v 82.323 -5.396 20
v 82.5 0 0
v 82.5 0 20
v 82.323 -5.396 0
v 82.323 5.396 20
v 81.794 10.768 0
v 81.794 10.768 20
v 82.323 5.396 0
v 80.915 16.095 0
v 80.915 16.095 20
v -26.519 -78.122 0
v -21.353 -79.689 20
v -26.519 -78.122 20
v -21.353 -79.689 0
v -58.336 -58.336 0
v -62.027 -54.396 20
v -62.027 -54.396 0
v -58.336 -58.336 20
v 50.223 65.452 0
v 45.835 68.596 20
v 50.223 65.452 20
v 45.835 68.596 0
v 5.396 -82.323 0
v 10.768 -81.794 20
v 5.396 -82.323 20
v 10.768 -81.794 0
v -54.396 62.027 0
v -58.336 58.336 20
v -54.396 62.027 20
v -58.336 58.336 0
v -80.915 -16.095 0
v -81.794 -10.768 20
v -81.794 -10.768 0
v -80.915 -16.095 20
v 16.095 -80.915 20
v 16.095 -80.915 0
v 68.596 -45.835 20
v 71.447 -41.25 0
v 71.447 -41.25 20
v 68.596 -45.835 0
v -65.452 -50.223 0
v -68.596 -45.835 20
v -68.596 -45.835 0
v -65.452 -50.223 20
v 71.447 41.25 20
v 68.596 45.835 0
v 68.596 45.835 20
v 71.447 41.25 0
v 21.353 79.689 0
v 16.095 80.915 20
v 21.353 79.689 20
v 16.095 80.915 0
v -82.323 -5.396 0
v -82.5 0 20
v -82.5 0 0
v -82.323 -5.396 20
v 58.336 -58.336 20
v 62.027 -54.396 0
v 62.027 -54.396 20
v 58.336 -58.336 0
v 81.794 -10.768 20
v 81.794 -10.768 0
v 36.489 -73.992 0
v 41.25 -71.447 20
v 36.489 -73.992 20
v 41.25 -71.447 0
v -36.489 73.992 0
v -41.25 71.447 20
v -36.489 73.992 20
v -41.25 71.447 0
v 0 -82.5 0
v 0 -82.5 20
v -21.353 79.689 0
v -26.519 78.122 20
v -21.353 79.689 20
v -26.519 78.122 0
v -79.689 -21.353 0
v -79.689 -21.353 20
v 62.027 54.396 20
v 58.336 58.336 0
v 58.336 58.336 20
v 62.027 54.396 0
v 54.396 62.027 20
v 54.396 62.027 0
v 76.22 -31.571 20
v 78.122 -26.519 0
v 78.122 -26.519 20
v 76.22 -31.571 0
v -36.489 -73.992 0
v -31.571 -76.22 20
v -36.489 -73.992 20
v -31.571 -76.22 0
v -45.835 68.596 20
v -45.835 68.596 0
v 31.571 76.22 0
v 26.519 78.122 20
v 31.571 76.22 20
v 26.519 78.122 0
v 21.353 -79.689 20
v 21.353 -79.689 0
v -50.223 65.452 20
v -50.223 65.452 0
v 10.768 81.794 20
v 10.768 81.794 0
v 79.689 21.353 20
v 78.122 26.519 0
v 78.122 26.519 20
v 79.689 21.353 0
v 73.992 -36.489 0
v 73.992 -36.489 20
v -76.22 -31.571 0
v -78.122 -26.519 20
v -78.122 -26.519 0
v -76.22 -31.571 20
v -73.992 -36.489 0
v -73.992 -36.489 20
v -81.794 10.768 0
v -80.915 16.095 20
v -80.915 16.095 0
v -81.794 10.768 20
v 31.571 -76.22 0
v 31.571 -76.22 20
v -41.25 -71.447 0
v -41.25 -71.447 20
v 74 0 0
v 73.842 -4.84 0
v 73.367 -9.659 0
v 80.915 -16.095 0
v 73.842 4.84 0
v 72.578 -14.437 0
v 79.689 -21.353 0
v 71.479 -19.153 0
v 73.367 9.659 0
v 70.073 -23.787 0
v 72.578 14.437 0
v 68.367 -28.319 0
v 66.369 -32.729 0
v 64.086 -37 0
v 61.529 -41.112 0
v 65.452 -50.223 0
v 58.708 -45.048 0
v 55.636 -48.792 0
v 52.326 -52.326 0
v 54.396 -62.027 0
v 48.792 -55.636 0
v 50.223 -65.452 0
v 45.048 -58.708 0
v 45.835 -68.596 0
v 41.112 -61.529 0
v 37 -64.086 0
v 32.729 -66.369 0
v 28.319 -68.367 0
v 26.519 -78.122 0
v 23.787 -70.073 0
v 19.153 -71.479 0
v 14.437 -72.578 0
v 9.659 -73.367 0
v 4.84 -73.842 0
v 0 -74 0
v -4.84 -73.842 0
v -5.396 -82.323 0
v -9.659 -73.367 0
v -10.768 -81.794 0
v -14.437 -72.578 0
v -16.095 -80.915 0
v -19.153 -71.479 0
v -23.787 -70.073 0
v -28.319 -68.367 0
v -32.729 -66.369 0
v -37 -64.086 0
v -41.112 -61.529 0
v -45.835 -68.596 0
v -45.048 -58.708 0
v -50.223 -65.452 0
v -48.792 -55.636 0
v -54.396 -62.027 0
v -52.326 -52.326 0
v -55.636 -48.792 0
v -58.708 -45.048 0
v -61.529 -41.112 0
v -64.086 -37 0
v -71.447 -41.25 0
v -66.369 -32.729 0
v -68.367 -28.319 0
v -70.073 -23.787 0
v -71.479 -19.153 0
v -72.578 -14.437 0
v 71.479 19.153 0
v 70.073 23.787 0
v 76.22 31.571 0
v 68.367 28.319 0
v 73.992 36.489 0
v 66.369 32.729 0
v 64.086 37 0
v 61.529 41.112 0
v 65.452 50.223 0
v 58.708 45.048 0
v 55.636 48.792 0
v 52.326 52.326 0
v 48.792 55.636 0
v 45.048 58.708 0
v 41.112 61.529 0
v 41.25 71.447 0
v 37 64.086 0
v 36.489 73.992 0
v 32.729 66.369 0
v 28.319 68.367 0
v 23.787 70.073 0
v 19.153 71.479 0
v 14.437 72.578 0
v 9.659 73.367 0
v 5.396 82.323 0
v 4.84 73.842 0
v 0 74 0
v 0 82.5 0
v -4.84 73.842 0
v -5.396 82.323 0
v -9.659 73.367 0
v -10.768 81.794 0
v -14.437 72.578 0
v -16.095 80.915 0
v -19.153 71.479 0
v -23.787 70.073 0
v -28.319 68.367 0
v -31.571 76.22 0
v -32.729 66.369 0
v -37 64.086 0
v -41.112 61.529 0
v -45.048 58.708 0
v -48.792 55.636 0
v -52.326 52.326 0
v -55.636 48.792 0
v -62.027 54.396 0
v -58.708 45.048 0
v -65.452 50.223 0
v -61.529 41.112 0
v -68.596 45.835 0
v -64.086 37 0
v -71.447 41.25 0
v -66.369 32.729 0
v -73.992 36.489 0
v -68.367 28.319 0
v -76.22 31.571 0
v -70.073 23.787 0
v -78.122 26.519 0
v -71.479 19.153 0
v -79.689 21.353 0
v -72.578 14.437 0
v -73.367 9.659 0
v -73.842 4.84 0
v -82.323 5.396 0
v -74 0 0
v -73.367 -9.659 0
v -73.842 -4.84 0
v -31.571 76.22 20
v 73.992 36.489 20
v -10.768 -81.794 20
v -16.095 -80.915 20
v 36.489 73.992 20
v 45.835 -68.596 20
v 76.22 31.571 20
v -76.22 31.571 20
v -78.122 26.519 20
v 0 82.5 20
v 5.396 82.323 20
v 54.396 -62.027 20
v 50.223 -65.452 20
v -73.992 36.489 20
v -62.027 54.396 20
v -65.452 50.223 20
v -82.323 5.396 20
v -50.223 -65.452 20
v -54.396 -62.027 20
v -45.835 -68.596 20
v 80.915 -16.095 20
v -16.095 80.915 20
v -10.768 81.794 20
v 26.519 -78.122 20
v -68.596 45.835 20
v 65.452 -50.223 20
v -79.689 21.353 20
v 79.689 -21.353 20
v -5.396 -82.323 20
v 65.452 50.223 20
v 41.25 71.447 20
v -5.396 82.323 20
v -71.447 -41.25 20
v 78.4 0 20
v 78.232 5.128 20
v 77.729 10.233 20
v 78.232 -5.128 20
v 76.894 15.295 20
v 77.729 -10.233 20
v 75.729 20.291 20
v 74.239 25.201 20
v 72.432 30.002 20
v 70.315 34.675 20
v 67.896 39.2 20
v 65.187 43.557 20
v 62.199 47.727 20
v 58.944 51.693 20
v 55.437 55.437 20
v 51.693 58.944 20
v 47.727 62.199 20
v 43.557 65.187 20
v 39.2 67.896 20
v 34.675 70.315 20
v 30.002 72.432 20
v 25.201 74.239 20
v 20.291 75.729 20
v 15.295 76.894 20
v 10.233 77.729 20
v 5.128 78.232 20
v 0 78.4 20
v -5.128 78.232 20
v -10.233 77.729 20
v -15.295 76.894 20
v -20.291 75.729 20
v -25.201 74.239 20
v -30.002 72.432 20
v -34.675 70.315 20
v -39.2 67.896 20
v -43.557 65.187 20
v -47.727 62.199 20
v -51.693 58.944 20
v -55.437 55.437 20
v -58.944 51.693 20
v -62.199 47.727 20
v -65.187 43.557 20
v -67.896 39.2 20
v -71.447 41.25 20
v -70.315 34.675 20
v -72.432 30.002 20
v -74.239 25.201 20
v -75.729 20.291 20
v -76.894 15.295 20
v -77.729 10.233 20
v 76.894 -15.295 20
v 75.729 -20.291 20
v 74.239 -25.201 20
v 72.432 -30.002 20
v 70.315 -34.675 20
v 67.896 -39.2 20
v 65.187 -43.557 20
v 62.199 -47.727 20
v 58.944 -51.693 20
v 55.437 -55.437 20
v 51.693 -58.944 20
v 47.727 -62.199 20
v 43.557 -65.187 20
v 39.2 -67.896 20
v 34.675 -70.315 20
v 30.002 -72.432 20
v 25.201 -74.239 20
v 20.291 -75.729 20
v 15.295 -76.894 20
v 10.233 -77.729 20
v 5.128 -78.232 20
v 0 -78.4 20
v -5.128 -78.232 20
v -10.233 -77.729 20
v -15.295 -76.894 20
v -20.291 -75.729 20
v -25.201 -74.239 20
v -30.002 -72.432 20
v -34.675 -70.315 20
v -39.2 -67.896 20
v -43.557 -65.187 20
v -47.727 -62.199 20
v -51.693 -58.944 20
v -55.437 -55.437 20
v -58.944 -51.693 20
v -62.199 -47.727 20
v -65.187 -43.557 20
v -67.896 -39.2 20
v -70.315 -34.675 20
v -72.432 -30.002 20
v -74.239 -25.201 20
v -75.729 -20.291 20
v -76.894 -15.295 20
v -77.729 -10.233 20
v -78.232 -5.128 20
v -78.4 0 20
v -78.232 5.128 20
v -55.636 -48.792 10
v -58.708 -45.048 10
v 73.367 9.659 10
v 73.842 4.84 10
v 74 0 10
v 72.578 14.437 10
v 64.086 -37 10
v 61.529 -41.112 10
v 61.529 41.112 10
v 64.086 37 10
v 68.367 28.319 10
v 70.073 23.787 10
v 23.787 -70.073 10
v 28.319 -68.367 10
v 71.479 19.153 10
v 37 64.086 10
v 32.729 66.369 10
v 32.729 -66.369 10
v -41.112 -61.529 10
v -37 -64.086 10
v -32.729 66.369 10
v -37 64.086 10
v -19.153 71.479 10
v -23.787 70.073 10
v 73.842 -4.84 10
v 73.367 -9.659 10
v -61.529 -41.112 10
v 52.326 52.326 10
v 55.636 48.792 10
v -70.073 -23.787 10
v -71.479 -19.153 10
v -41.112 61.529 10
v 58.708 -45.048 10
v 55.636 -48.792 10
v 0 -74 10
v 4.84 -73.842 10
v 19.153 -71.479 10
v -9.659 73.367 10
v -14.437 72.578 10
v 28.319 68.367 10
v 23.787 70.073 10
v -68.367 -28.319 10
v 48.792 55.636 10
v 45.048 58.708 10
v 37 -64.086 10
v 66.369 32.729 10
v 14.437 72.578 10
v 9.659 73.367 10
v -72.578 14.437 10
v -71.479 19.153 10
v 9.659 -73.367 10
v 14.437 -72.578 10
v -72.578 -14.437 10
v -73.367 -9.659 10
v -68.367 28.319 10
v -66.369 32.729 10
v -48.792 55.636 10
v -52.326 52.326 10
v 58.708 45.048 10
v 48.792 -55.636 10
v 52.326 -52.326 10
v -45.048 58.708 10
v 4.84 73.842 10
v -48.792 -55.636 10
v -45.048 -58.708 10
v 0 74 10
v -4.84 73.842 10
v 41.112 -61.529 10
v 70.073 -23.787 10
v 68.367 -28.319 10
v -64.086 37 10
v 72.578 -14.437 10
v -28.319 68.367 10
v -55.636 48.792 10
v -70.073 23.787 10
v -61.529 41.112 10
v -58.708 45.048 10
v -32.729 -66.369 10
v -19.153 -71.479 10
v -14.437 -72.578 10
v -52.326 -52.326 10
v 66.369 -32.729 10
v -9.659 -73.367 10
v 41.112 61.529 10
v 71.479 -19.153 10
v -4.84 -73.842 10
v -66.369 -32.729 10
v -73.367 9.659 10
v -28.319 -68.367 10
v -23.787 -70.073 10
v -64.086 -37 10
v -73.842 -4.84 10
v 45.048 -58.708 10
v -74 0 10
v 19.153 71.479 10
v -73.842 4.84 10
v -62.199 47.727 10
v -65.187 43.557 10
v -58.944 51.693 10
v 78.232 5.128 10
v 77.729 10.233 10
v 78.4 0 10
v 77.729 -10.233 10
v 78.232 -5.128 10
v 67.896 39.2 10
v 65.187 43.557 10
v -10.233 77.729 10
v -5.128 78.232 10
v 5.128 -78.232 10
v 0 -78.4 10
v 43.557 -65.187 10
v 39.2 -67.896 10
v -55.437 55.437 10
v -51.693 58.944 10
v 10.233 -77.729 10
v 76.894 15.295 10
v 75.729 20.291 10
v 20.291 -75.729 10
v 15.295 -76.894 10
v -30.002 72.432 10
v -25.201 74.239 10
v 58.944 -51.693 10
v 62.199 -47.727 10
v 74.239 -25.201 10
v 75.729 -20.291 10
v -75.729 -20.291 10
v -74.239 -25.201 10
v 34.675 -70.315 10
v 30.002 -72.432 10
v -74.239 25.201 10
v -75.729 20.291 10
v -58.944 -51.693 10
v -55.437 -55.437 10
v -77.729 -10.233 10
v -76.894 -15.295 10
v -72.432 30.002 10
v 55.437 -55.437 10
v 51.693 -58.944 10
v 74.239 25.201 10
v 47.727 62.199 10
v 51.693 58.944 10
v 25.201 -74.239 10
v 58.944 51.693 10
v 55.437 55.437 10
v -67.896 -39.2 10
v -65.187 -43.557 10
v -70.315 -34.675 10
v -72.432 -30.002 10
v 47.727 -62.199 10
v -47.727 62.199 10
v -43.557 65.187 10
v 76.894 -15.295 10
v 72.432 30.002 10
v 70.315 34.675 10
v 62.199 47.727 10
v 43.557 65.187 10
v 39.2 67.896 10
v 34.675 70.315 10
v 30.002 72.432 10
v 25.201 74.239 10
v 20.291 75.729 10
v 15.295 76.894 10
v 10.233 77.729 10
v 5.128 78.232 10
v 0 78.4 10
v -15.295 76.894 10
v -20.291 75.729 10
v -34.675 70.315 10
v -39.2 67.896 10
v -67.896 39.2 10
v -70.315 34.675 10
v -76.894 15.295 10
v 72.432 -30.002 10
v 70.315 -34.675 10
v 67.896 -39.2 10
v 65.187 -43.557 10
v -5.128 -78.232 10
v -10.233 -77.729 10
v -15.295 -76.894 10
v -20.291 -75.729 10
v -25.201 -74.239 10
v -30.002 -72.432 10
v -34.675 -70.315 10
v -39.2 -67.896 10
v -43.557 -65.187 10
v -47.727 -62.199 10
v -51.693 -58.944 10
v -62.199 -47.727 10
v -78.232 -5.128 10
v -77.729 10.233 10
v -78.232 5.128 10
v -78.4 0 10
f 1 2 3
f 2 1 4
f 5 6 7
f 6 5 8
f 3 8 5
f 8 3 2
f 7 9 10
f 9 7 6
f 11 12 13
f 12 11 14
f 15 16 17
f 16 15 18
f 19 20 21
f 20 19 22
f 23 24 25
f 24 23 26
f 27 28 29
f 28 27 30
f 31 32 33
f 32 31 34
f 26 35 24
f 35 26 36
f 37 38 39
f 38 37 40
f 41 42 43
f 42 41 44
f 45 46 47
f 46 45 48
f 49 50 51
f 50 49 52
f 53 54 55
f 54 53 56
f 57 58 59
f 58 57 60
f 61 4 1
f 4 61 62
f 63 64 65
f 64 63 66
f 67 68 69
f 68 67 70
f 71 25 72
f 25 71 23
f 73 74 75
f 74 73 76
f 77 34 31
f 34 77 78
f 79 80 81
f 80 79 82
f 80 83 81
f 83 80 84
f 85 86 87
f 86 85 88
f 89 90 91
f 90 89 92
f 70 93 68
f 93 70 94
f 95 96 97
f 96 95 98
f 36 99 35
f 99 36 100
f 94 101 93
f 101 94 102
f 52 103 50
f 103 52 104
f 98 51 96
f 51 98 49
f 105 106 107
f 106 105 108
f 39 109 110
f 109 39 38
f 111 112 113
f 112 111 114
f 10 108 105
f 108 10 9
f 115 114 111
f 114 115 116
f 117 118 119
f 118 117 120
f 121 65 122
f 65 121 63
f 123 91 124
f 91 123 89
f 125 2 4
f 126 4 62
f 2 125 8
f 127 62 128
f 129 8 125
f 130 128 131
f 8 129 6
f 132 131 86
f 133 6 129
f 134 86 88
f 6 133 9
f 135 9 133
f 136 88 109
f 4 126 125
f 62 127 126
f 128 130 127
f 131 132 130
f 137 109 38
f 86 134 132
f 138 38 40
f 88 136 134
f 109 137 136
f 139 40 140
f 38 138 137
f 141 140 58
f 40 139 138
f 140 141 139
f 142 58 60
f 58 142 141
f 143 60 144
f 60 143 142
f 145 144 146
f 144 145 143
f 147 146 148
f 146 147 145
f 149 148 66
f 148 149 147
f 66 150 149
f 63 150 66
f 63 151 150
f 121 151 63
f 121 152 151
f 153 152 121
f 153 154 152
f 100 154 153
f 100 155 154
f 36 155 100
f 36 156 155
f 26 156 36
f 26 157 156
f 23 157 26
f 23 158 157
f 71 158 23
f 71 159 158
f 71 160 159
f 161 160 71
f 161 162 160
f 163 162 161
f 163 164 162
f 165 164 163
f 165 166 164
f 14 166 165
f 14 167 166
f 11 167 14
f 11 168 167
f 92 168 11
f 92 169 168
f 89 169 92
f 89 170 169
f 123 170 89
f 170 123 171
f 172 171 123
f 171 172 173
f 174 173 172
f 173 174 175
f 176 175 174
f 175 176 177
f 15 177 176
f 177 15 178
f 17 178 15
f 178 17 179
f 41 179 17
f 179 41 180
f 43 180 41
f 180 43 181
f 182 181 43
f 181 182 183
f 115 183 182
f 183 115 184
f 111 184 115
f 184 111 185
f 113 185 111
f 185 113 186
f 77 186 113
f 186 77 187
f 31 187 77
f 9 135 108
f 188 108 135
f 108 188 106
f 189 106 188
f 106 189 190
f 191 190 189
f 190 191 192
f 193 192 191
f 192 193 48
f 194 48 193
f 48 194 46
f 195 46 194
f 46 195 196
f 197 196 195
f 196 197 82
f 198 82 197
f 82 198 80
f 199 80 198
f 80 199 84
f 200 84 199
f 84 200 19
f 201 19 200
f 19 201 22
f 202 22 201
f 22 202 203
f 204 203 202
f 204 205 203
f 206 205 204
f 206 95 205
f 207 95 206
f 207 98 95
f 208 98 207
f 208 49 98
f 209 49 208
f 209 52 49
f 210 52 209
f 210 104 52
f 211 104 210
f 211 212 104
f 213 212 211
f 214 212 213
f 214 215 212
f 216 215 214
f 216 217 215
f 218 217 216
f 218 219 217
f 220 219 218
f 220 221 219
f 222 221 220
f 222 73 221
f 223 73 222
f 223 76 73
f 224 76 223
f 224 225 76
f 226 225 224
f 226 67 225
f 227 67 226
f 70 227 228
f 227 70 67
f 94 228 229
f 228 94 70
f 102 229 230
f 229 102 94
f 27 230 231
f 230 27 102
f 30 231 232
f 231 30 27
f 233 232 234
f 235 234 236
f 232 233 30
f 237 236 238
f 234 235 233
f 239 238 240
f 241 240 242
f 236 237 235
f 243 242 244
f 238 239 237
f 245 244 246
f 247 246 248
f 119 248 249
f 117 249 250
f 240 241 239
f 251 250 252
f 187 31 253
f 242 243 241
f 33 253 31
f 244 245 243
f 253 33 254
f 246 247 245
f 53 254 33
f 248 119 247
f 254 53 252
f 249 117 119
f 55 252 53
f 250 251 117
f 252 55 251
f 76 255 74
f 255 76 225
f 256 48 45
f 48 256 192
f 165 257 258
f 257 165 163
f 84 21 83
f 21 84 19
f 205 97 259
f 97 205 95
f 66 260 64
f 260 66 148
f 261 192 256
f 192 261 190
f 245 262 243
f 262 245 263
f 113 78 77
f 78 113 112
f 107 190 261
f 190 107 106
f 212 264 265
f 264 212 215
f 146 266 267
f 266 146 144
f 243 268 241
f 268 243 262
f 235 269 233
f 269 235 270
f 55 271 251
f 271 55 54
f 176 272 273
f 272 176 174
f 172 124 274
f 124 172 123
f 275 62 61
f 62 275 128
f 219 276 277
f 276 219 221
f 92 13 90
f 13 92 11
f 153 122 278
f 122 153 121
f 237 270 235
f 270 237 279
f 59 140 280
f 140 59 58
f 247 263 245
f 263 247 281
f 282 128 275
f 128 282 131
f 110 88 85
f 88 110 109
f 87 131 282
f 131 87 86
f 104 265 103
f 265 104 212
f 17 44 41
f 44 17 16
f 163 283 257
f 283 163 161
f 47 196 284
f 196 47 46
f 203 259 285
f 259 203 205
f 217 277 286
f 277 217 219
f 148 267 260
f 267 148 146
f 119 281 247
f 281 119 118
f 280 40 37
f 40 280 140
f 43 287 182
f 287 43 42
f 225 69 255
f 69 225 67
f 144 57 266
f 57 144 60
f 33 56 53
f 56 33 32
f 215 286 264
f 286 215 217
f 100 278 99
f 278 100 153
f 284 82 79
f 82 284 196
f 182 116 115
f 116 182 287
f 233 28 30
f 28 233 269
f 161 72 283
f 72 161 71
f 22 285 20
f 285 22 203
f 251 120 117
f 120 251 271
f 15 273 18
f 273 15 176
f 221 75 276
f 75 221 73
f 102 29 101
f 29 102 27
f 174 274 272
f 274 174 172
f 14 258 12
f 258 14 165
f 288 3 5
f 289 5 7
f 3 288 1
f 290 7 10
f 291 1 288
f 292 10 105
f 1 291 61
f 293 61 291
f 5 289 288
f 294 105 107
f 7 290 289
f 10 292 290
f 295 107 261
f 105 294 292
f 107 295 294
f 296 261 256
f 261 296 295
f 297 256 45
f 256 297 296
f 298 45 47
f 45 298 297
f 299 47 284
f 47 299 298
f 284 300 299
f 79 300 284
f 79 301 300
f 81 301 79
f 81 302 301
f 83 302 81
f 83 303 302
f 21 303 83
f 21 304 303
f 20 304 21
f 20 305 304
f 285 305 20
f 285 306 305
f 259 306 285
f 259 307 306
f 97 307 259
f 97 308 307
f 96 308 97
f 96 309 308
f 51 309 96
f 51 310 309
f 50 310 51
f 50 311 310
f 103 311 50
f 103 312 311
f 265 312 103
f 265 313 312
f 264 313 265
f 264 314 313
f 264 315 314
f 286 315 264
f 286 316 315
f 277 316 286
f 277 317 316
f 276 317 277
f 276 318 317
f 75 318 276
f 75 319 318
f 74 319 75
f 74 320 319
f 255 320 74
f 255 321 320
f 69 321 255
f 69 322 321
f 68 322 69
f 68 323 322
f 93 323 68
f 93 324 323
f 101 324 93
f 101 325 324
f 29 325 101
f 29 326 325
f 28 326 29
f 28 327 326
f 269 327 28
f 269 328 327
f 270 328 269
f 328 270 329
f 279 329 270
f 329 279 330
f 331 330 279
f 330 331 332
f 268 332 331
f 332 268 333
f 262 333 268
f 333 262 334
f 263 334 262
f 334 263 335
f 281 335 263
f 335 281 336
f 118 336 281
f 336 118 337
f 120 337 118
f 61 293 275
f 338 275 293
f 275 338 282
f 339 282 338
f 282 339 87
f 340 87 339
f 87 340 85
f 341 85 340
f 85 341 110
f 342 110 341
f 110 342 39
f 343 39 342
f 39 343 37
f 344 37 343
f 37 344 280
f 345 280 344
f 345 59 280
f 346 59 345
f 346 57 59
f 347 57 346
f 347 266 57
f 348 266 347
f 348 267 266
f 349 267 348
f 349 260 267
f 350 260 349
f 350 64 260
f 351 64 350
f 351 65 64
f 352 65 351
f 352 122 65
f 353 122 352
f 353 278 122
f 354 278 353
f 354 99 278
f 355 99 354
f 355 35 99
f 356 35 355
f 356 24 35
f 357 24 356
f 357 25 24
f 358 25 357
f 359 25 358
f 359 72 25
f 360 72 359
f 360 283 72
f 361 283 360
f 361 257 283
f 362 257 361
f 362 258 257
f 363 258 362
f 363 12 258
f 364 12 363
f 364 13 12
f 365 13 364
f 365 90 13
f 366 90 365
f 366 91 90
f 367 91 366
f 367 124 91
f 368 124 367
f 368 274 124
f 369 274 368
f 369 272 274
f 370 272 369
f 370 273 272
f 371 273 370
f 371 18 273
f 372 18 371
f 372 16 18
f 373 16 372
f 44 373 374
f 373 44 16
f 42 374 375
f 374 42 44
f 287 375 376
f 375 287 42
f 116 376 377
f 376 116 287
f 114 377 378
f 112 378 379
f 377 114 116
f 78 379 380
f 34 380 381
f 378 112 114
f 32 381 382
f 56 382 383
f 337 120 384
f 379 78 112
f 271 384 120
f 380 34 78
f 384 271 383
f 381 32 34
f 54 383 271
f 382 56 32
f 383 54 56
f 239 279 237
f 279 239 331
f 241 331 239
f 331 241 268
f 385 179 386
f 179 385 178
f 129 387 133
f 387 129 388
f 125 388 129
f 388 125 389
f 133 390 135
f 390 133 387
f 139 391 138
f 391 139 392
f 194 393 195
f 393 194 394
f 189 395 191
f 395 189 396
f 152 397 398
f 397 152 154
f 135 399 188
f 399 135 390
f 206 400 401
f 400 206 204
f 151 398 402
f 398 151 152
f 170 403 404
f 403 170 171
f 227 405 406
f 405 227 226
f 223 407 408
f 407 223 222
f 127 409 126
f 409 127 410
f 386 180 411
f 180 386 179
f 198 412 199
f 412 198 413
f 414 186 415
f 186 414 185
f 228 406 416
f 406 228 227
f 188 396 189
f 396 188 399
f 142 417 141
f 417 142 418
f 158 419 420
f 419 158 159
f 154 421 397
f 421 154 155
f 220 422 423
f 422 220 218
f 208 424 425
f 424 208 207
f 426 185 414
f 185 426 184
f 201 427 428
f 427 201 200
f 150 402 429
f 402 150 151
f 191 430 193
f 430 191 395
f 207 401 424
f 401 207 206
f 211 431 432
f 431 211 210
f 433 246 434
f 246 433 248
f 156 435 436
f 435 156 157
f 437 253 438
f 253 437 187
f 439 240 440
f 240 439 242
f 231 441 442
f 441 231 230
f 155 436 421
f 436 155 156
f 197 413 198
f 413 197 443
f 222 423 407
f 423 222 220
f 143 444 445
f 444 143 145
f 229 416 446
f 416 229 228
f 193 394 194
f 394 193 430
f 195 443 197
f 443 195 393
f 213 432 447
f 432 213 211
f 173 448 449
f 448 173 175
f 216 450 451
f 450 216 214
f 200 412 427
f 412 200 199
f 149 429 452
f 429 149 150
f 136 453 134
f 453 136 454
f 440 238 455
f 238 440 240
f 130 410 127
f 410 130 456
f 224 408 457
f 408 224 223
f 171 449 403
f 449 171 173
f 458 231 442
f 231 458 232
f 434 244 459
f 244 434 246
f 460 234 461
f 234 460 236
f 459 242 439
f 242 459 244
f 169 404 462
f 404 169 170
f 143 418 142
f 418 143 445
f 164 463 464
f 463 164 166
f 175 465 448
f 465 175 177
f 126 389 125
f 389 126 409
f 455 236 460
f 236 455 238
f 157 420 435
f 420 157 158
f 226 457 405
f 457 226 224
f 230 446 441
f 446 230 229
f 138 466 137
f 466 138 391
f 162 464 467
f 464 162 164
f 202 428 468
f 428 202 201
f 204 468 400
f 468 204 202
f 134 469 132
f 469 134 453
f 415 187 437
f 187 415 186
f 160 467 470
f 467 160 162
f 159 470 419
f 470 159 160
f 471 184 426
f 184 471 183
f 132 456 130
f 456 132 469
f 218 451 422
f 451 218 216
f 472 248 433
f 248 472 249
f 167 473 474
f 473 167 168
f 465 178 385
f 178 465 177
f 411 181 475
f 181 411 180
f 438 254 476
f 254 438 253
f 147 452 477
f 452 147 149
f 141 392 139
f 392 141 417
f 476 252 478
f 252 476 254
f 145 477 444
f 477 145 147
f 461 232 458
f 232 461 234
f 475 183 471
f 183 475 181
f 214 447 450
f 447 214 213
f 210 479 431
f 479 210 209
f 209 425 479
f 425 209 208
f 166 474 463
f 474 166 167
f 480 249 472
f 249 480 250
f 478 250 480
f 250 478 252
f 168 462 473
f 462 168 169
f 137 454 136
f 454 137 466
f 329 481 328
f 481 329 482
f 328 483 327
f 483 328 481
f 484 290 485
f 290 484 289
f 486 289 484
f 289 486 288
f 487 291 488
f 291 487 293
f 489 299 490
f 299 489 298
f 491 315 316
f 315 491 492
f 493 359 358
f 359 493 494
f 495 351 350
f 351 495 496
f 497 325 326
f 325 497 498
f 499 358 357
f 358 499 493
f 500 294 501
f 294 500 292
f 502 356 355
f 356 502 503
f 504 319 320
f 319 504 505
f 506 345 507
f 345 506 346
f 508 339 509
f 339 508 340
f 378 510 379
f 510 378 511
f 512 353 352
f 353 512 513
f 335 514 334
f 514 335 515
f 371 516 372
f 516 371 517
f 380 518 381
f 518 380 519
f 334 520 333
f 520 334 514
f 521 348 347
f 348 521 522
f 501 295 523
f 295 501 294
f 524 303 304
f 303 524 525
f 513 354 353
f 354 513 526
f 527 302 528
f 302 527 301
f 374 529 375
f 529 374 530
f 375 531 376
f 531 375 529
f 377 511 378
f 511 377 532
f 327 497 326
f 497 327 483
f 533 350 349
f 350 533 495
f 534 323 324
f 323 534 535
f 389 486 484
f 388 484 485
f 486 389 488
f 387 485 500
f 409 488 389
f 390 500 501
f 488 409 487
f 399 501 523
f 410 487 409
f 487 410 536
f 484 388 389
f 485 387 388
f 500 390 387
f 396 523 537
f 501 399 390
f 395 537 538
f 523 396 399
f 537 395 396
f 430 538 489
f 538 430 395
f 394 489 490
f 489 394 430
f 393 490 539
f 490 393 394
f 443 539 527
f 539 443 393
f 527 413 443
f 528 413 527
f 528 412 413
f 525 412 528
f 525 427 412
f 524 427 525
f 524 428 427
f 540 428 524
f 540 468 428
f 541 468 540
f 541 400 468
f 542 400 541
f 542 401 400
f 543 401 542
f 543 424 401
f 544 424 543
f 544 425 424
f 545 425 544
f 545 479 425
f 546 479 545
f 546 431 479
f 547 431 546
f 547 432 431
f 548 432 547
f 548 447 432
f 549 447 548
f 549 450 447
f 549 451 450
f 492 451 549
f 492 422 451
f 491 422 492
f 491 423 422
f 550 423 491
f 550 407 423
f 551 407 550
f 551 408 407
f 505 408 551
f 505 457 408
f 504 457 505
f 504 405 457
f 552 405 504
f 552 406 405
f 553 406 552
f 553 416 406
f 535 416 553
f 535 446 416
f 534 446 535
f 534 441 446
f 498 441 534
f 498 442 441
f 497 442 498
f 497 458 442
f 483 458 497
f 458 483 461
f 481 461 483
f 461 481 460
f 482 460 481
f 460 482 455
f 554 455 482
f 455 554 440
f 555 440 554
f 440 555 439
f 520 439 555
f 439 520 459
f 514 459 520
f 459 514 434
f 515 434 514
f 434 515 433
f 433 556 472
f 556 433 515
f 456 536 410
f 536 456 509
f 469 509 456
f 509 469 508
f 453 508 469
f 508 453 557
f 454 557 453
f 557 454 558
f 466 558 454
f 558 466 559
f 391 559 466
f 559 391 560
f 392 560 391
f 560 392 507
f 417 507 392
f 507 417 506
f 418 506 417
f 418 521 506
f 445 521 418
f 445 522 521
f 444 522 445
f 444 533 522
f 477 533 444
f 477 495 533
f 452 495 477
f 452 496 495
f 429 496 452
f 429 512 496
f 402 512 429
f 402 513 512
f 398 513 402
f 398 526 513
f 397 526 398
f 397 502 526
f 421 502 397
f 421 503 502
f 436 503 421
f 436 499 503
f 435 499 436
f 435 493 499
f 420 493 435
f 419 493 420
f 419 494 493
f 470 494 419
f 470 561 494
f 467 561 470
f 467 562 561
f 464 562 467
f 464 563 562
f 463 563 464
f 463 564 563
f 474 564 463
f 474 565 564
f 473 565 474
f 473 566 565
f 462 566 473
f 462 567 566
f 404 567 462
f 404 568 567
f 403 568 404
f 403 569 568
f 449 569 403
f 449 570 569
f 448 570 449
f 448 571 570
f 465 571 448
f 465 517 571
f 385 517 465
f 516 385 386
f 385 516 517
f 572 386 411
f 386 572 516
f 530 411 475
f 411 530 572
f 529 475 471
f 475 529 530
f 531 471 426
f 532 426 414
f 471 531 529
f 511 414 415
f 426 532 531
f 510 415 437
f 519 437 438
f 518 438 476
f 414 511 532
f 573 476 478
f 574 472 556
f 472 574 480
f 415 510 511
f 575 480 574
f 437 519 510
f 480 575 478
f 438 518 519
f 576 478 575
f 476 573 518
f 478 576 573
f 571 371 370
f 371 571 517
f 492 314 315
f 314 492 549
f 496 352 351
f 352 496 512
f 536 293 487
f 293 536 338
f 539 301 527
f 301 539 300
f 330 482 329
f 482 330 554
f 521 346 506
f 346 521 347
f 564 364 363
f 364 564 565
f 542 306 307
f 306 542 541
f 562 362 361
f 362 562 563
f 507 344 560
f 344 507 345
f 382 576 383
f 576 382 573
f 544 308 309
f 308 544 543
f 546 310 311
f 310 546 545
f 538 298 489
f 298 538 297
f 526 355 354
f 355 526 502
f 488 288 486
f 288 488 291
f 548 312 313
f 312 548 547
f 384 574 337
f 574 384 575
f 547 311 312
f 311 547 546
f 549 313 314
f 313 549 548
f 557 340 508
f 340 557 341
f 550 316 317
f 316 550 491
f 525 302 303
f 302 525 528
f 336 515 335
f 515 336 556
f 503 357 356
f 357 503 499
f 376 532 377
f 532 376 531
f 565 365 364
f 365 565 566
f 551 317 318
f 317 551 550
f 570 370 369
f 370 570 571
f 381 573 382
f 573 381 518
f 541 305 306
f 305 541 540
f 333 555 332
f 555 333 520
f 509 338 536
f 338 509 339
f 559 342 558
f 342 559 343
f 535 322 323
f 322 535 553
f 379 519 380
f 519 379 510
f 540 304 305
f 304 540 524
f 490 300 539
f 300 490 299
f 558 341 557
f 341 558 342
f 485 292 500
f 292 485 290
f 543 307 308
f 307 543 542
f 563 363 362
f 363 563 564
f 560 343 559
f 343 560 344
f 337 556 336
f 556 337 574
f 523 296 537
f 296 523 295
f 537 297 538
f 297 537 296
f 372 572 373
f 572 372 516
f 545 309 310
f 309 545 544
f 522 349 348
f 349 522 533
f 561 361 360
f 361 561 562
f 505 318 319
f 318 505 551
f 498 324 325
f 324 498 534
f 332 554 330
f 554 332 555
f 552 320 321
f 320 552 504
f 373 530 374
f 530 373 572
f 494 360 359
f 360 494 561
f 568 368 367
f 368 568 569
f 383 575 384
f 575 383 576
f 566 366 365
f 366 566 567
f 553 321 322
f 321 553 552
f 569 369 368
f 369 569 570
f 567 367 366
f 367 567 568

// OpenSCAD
// file: params.scad
// ==========================================
// Coffee Cooler Parameters / コーヒークーラー共通パラメータ
// ==========================================

// --- Global Settings / 全体設定 ---
$fn = 96;           // Rendering resolution / 円や曲面の分割数
wall = 3;           // Standard wall thickness / 標準の壁厚
clearance = 0.4;    // General mechanical clearance / 嵌合や穴用の基本クリアランス

// --- Main Body Sections / 本体の主要寸法 ---
body_outer_d = 165;  // Outer diameter of the main cylindrical body / 本体円筒部の外径
top_ring_h = 20;     // Height of the top ring that holds the sieve / ザル受け上部リングの高さ
plenum_h = 45;       // Height of the air plenum section / ザル下の整流空間の高さ
base_h = 80;         // Height of the base section (housing the fan) / ファンを収めるベース部の高さ

// --- Sieve & Gasket (Top Section) / ザルとガスケット ---
// Parameters for the coffee sieve/filter / コーヒー用うらごしザルの寸法
sieve_ring_outer_d = 156;                 // ザル付属金属リングの外径
sieve_outer_d = sieve_ring_outer_d;       // mock表示用のザル外径。実寸基準はsieve_ring_outer_d
sieve_h = 55;                             // ザル全体の高さ
sieve_ring_seat_d = sieve_ring_outer_d + 0.8;  // top_ring側のザル受けポケット径
sieve_ring_seat_depth = 10;               // ザル受けポケットの深さ
sieve_opening_d = 148;                    // top_ring中央の吸気開口径
sieve_loop_relief_w = 30;                 // 未使用: ザル横リング逃げの幅
sieve_loop_relief_d = 7;                  // 未使用: ザル横リング逃げの奥行き
sieve_loop_relief_h = 12;                 // 未使用: ザル横リング逃げの高さ
sieve_seat_d = sieve_ring_seat_d;         // 互換用: ザル受け径
sieve_lip_h = sieve_ring_seat_depth;      // 互換用: ザル受けリップ高さ

// Gasket parameters (intended for TPU printing) / TPUガスケット寸法
gasket_outer_d = sieve_ring_seat_d - 0.4;  // TPUガスケットの外径
gasket_inner_d = sieve_opening_d + 1.0;    // TPUガスケットの内径
gasket_h = 1.2;                            // TPUガスケットの厚み
gasket_loop_relief_w = sieve_loop_relief_w + 2;  // 未使用: 旧切り欠き用の幅
gasket_loop_relief_d = sieve_loop_relief_d + 1;  // 未使用: 旧切り欠き用の奥行き

// --- Fan & Mount / 120mmファンと固定部 ---
// Standard 120mm fan parameters / 一般的な120mm PCファン寸法
fan_size = 120;              // ファン外形サイズ
fan_clearance = 1.0;         // ファン外形まわりの逃げ
fan_cutout_d = 113;          // ファン開口径
fan_hole_pitch = 105;        // ファン固定穴ピッチ
fan_screw_d = 4.5;           // ファン固定ネジの通し穴径
fan_thickness = 25;          // ファン厚み
fan_plate_thickness = 4;     // ファン取付プレートの厚み
fan_seal_lip_h = 2;          // ファン開口まわりのシールリップ高さ
fan_seal_lip_w = 7;          // ファン開口まわりのシールリップ幅

// --- Ventilation Slots / 側面排気スリット ---
// Air exhaust slots on the base / ベース側面の排気口寸法
vent_slot_w = 34;       // 排気スリットの横幅
vent_slot_h = 9;        // 排気スリットの高さ
vent_row_pitch = vent_slot_h + 6;  // 排気スリットの段間ピッチ
vent_rows = 4;          // 排気スリットの段数
vent_count = 8;         // 円周方向の排気スリット数
vent_center_z = base_h / 2;  // 排気スリット群の中心高さ

// --- Electronics Bay / 電装室 ---
// Internal space for PWM controller and DC barrel jack. / PWMコントローラとDC電源ジャックの収納部
electronics_box_d = 32;  // 電装室の奥行き
electronics_box_w = 80;  // 電装室の幅
electronics_box_h = 45;  // 電装室の高さ
// main file
include <params.scad>

module top_ring() {
    difference() {
        cylinder(h = top_ring_h, d = body_outer_d);

        // Main airflow opening. The metal sieve ring sits on the remaining ledge.
        translate([0, 0, -1])
            cylinder(h = top_ring_h + 2, d = sieve_opening_d);

        // Shallow upper pocket for the sieve's attached metal outer ring.
        translate([0, 0, top_ring_h - sieve_ring_seat_depth])
            cylinder(h = sieve_ring_seat_depth + 1, d = sieve_ring_seat_d);

    }
}

top_ring();
